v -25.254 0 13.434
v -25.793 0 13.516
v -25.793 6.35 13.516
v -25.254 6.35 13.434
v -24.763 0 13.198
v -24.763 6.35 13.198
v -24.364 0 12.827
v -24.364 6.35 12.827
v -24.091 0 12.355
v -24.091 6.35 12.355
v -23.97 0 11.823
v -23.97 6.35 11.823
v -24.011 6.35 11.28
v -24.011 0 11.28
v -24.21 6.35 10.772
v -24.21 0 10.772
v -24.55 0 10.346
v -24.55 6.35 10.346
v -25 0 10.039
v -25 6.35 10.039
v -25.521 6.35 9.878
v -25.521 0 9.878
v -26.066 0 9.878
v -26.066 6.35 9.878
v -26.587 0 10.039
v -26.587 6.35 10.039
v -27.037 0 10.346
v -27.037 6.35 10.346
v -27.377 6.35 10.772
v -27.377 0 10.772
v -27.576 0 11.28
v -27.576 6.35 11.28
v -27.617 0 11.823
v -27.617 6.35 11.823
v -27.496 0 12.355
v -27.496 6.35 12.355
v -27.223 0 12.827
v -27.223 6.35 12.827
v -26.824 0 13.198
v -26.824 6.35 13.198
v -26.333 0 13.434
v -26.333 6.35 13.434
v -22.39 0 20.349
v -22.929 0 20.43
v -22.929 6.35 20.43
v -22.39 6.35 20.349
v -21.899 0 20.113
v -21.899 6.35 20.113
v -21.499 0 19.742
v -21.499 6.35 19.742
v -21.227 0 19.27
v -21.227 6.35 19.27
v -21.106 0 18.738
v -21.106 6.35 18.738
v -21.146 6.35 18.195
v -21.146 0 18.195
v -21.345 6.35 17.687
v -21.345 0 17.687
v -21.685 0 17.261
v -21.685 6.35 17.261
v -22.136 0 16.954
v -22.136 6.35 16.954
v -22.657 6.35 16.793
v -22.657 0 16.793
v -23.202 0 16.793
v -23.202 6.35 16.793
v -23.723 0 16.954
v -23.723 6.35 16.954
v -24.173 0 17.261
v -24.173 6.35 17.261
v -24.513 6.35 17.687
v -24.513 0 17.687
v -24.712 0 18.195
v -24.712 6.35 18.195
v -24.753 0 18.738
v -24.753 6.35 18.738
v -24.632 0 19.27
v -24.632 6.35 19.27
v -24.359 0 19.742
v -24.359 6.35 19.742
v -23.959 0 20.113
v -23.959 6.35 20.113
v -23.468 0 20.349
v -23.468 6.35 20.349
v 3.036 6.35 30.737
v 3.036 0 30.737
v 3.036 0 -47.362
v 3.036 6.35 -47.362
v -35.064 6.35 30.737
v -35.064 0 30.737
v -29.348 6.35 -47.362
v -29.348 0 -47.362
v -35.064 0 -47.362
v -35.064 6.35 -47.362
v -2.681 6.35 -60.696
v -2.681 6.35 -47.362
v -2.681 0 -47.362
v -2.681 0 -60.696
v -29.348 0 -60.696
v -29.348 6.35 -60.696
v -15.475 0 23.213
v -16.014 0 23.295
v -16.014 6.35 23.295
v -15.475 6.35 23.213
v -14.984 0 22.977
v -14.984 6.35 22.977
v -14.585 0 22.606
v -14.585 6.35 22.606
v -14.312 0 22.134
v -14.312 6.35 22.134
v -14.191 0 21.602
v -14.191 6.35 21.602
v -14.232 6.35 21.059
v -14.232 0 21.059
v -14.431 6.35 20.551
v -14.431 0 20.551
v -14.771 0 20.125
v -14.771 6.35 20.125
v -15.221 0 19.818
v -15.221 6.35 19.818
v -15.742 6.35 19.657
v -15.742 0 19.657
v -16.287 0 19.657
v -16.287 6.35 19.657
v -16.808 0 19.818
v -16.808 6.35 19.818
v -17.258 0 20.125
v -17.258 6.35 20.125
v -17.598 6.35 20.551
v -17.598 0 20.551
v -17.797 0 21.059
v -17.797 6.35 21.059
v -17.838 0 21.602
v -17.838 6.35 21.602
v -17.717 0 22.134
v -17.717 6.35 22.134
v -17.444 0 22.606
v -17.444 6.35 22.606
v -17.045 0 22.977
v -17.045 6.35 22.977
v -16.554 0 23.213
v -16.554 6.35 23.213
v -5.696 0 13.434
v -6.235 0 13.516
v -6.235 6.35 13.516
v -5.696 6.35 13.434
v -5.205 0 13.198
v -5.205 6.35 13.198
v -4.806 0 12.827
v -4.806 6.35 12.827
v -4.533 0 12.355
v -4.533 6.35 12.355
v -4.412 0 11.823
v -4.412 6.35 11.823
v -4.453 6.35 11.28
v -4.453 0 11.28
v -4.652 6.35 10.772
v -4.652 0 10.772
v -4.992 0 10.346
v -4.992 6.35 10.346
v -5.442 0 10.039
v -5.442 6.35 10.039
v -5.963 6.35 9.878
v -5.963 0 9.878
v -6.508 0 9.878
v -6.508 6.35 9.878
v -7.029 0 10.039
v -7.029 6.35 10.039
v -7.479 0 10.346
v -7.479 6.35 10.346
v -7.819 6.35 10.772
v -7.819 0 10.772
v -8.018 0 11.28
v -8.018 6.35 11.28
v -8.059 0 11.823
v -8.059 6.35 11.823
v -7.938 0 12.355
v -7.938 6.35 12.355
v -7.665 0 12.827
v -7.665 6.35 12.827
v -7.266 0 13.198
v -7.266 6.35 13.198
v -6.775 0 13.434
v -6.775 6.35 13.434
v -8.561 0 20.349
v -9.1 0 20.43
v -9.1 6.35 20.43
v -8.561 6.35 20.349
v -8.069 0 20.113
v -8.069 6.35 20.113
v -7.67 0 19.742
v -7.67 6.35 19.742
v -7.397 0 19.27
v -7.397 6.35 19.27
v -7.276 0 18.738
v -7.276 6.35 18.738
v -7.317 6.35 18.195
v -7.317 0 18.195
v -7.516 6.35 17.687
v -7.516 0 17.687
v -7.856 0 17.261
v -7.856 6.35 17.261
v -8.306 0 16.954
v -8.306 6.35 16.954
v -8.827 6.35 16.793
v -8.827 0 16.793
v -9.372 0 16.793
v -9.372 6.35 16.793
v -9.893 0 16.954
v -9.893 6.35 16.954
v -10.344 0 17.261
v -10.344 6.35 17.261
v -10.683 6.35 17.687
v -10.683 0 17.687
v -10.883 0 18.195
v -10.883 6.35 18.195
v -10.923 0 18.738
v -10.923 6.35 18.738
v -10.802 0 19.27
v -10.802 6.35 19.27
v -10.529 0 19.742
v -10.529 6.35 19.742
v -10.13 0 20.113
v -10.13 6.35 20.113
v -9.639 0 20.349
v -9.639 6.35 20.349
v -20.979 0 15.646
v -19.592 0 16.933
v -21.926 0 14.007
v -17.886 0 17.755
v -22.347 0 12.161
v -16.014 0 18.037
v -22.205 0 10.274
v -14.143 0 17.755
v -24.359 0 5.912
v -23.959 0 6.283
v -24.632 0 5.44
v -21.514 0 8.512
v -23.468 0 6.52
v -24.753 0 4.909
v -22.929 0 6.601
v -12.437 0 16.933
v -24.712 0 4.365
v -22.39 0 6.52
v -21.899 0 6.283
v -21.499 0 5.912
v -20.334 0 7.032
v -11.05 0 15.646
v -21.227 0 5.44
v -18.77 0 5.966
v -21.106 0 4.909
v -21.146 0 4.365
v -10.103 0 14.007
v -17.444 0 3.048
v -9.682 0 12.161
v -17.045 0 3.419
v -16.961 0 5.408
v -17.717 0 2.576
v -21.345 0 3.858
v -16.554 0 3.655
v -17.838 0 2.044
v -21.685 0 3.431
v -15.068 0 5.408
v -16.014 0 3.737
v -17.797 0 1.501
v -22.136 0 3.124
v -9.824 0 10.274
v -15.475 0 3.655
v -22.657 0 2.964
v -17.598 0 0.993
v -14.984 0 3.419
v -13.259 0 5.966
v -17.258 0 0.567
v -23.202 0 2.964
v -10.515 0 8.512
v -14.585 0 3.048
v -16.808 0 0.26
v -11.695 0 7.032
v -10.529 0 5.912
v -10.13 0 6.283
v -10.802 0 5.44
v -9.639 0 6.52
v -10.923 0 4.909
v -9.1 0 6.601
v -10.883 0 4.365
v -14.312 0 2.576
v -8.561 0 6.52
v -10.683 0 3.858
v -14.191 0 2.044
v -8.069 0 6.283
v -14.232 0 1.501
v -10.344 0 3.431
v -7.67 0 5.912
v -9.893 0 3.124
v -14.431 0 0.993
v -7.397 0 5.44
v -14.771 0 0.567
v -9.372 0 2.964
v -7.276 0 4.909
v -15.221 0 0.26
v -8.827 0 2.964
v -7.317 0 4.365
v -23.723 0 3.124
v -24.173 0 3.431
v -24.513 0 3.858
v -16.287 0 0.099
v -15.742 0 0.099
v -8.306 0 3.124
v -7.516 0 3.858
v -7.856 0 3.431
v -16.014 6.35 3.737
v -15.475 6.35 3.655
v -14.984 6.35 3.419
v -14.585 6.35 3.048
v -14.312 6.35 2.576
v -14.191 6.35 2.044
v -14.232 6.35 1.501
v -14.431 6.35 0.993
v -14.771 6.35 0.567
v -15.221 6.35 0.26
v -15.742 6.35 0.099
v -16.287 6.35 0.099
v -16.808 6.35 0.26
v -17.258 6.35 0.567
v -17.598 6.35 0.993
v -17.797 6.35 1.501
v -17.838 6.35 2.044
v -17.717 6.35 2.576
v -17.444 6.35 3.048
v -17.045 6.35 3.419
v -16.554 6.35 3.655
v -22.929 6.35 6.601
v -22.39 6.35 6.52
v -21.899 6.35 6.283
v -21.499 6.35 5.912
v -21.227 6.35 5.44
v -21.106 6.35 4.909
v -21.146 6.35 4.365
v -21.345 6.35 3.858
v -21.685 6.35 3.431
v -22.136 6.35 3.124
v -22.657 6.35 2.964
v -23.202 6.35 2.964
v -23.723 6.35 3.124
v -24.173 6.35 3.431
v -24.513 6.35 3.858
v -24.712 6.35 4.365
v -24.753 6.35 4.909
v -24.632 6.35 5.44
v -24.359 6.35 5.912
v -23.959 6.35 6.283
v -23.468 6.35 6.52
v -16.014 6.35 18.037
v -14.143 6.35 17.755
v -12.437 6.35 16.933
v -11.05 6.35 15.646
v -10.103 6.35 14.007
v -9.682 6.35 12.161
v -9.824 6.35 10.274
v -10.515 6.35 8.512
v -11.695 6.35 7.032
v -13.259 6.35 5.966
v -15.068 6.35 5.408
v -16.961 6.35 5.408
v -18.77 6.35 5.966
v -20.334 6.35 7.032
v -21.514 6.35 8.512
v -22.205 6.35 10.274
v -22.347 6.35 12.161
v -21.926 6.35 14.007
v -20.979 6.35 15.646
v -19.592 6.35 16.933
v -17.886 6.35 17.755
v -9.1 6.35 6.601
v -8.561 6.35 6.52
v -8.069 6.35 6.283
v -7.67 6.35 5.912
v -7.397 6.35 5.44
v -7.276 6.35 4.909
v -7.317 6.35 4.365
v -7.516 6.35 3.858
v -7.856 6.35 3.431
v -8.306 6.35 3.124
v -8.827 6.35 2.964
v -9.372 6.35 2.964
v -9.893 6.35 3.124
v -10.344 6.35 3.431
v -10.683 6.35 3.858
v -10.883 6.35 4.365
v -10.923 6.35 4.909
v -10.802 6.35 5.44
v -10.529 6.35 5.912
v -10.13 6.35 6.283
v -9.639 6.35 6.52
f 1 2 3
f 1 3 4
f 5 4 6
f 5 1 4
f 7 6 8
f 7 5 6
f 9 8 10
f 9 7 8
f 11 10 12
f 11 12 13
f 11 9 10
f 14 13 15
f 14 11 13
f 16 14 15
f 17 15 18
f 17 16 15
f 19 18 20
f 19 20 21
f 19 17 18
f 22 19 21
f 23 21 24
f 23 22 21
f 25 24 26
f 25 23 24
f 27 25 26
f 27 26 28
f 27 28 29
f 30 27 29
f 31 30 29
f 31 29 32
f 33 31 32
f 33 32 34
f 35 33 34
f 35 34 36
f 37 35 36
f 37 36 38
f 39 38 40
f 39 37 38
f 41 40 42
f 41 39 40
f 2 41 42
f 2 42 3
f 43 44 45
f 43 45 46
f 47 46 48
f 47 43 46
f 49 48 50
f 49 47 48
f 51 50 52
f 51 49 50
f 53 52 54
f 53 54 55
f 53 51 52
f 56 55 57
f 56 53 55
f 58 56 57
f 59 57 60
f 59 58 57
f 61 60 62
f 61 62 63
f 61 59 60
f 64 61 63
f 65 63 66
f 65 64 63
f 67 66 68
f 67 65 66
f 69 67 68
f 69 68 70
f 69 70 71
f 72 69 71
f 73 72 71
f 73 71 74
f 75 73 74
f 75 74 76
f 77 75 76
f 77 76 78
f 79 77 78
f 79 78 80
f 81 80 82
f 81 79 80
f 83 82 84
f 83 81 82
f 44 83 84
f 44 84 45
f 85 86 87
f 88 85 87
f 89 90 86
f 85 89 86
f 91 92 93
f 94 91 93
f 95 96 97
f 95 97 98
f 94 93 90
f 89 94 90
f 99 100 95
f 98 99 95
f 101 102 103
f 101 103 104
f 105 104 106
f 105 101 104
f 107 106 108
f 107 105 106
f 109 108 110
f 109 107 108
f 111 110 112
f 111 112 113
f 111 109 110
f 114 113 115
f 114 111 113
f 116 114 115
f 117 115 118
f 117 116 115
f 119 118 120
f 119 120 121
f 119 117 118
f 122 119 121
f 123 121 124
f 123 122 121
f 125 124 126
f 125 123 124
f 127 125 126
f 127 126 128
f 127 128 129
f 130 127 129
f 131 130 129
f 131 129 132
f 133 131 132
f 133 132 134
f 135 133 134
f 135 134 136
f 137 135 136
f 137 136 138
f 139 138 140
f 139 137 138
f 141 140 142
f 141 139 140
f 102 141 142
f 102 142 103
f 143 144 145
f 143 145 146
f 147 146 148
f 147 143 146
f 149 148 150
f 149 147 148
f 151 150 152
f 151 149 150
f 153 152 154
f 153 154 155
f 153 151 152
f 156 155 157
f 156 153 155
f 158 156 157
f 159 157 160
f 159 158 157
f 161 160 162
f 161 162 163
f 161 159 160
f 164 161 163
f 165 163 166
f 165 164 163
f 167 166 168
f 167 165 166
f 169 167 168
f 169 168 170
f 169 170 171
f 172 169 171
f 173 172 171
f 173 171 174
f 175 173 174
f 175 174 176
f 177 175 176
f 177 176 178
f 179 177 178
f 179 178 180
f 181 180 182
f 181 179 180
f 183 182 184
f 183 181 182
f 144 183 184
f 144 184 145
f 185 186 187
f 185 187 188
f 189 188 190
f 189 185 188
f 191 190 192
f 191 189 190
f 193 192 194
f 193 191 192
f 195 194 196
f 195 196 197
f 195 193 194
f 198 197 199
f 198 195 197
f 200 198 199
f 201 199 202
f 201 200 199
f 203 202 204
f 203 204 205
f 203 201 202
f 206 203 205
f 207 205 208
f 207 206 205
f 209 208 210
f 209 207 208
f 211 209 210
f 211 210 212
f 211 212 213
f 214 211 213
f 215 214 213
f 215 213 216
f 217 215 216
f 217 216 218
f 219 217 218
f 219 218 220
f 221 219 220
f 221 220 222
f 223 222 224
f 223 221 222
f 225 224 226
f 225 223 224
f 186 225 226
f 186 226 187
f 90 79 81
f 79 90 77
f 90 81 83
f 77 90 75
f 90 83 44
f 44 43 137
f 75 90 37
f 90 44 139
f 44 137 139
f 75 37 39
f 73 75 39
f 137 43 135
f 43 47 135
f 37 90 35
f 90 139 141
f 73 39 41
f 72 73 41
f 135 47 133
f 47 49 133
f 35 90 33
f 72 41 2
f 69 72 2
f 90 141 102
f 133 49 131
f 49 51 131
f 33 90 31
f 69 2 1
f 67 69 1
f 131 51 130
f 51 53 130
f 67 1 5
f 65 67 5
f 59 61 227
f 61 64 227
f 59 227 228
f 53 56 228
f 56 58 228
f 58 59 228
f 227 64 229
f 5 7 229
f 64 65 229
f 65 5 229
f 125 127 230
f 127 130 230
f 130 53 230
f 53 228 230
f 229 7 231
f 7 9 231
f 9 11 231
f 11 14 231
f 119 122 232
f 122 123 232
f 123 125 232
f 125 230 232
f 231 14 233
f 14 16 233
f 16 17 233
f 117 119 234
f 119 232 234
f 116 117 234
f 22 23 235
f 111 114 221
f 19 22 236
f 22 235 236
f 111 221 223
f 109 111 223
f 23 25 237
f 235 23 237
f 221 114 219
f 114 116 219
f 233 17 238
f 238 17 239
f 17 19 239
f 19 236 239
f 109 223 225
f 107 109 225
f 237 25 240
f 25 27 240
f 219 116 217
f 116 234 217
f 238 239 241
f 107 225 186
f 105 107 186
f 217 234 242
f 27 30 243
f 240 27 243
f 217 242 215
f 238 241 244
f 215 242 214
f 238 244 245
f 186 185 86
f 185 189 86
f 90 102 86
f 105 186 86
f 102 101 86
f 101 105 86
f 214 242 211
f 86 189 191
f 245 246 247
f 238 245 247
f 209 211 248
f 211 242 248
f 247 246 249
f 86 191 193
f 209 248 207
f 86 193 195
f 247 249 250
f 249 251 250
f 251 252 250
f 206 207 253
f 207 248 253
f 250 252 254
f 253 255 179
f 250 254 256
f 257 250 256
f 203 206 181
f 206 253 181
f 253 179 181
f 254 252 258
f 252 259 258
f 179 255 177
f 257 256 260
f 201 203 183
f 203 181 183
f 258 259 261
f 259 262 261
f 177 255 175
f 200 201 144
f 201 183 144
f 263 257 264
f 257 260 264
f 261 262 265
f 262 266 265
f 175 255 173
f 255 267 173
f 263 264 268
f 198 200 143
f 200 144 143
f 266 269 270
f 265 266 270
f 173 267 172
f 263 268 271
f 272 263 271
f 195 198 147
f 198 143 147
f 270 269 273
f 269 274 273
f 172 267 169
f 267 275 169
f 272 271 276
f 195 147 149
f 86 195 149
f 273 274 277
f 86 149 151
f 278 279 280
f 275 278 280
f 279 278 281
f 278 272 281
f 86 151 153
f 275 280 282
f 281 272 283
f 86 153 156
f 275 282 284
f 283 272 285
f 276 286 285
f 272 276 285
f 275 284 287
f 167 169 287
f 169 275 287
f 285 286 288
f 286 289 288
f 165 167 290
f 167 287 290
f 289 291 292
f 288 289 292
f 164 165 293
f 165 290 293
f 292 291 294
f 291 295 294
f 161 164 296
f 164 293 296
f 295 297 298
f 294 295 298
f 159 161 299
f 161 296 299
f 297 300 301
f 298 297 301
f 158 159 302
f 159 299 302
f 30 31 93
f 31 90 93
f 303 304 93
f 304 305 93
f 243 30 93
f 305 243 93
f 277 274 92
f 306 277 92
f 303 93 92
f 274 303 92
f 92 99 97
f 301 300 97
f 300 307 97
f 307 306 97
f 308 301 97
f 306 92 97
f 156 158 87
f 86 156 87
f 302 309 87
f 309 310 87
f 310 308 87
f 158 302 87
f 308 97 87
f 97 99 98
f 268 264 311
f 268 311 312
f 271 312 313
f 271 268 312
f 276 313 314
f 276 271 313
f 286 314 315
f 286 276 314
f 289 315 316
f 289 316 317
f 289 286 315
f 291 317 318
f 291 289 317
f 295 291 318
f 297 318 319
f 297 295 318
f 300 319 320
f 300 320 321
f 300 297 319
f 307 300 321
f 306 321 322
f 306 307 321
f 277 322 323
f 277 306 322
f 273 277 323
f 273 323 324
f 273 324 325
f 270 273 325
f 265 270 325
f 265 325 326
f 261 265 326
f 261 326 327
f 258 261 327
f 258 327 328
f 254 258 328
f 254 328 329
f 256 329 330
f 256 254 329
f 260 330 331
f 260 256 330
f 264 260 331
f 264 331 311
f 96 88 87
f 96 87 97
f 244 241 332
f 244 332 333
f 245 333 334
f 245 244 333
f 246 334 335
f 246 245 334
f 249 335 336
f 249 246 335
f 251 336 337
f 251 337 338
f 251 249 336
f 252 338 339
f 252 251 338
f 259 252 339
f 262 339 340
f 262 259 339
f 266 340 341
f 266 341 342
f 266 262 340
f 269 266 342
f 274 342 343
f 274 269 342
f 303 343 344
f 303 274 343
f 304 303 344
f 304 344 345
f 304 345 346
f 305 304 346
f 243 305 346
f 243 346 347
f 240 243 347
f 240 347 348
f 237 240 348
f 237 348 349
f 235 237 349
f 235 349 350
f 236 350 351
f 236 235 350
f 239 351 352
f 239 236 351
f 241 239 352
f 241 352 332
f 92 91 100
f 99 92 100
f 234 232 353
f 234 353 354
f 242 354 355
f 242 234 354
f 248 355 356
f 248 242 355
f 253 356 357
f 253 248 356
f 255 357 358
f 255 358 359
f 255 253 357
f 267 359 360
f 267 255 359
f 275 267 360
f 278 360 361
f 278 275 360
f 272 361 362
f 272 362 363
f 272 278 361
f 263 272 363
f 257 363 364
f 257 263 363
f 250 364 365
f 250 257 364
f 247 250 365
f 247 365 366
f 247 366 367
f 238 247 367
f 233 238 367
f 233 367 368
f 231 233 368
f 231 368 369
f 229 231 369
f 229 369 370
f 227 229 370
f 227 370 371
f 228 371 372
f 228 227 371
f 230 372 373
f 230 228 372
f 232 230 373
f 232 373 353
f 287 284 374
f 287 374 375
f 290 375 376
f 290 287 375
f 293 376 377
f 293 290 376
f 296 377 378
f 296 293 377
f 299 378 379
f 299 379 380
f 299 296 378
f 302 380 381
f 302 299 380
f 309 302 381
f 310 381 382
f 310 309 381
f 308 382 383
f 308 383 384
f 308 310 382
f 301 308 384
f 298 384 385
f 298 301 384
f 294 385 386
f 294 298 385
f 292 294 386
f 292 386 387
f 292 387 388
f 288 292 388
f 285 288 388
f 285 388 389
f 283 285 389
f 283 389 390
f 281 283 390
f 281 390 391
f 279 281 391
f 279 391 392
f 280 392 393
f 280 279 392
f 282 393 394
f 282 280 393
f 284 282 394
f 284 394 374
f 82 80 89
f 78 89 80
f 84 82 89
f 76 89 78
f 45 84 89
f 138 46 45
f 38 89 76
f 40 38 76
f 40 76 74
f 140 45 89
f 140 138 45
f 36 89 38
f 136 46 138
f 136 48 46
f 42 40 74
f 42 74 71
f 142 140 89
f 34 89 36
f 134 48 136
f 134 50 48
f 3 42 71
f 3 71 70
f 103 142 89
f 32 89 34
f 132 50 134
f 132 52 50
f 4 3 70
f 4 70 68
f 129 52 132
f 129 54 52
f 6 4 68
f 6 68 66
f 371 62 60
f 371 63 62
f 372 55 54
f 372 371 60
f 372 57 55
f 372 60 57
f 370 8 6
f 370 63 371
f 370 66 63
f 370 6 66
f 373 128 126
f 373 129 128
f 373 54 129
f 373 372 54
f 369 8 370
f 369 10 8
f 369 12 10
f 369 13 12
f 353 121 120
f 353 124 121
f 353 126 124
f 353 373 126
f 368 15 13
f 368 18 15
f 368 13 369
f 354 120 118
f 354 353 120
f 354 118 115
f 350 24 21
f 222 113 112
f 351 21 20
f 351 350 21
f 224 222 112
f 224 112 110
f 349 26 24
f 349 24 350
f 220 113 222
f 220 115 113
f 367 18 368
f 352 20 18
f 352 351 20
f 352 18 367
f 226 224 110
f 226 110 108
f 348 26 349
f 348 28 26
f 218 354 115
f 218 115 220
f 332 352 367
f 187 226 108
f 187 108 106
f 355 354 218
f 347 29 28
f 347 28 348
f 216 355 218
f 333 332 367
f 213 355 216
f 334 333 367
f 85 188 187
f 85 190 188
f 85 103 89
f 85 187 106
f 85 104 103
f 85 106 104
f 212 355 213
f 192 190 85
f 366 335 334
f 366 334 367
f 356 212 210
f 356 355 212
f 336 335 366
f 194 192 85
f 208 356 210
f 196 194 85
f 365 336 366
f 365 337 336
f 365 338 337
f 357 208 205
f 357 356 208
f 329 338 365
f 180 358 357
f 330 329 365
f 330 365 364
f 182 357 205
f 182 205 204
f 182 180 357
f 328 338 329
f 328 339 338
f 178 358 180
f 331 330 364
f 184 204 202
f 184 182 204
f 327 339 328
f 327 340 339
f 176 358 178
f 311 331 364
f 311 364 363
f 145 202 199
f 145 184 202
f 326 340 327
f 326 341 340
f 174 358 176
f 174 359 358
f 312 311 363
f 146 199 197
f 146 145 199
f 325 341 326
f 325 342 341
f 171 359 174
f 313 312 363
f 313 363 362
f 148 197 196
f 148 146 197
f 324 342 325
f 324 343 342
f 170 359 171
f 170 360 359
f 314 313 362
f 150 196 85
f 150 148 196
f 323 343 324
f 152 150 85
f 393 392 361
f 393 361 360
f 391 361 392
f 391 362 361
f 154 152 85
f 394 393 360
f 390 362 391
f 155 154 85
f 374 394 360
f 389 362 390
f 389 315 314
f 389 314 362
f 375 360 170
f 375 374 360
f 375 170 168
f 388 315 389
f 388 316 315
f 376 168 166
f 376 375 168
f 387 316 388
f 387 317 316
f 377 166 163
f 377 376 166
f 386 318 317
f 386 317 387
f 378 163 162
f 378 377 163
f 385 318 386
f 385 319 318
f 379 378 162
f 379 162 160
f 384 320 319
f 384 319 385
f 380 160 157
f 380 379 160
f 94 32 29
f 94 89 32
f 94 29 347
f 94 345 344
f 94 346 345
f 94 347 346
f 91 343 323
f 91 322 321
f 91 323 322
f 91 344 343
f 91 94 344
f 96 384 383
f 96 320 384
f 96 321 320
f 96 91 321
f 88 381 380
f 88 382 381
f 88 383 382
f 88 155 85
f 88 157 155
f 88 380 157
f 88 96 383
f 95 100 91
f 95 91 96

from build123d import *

# Parameters (mm, degrees)
SKETCH1_R           = 6.35
SKETCH1_R_2         = 1.8288
BOSS_EXTRUDE1_DEPTH = 6.35
SKETCH2_W           = 26.667
SKETCH2_H           = 26.667
BOSS_EXTRUDE2_DEPTH = 6.35


with BuildPart() as part:
    # Sketch1 → Boss-Extrude1 (new body)
    with BuildSketch(Plane(origin=(0, 0, 0), x_dir=(1, 0, 0), z_dir=(0, 1, 0))):
        Polygon((-35.064474094, 47.36223941), (-35.064474094, 7.36323941), (-35.064474094, -30.73676059), (3.035525906, -30.73676059), (3.035525906, 7.36323941), (3.035525906, 47.36223941), align=None)
        with Locations(Location((-16.014474094, -11.68676059, 0), (0, 0, 270))):
            Circle(SKETCH1_R, mode=Mode.SUBTRACT)
        with Locations(Location((-16.014474094, -21.46576059, 0), (0, 0, 270))):
            Circle(SKETCH1_R_2, mode=Mode.SUBTRACT)
        with Locations(Location((-22.929271308, -18.601557803, 0), (0, 0, 270))):
            Circle(SKETCH1_R_2, mode=Mode.SUBTRACT)
        with Locations(Location((-25.793474094, -11.68676059, 0), (0, 0, 270))):
            Circle(SKETCH1_R_2, mode=Mode.SUBTRACT)
        with Locations(Location((-22.929271308, -4.771963377, 0), (0, 0, 270))):
            Circle(SKETCH1_R_2, mode=Mode.SUBTRACT)
        with Locations(Location((-16.014474094, -1.90776059, 0), (0, 0, 270))):
            Circle(SKETCH1_R_2, mode=Mode.SUBTRACT)
        with Locations(Location((-9.099676881, -4.771963377, 0), (0, 0, 270))):
            Circle(SKETCH1_R_2, mode=Mode.SUBTRACT)
        with Locations(Location((-6.235474094, -11.68676059, 0), (0, 0, 270))):
            Circle(SKETCH1_R_2, mode=Mode.SUBTRACT)
        with Locations(Location((-9.099676881, -18.601557803, 0), (0, 0, 270))):
            Circle(SKETCH1_R_2, mode=Mode.SUBTRACT)
    extrude(amount=BOSS_EXTRUDE1_DEPTH)

    # Sketch2 → Boss-Extrude2 (add)
    with BuildSketch(Plane(origin=(0, 6.35, 0), x_dir=(1, 0, 0), z_dir=(0, 1, 0))):
        with Locations((-16.014474094, 47.36223941)):
            Rectangle(SKETCH2_W, SKETCH2_H)
    extrude(amount=-BOSS_EXTRUDE2_DEPTH)


solid = part.part
